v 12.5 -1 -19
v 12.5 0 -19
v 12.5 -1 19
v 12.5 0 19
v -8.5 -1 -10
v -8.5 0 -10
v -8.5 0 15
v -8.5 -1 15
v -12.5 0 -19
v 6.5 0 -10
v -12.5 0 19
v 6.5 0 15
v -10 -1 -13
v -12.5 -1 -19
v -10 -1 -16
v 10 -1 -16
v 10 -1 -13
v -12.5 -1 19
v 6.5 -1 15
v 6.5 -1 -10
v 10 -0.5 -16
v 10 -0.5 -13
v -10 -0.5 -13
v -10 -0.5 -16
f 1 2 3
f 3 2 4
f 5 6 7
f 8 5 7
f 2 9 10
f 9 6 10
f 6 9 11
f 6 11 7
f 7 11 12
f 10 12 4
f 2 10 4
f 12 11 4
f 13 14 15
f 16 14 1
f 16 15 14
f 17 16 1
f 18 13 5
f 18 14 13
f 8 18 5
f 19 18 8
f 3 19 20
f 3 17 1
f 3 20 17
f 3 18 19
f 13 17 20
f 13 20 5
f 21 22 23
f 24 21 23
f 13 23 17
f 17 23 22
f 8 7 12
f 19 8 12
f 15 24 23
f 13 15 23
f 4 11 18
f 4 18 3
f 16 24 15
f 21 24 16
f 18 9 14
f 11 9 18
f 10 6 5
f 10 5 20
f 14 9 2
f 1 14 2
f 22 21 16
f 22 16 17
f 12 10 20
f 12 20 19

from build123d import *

# Parameters (mm, degrees)
F0_W     = 25
F0_H     = 38
F0_W_2   = 20
F0_H_2   = 3
F0_W_3   = 15
F0_H_3   = 25
F1_DEPTH = 1
F2_W     = 22.4918248132
F2_H     = 4.8074135557
F2_W_2   = 20
F2_H_2   = 3
F3_DEPTH = 0.5


with BuildPart() as f1:
    # F0 (on Front) → F1 (new body)
    with BuildSketch(Plane.XZ):
        Rectangle(F0_W, F0_H)
        with Locations((0, -14.5)):
            Rectangle(F0_W_2, F0_H_2, mode=Mode.SUBTRACT)
        with Locations((-1, 2.5)):
            Rectangle(F0_W_3, F0_H_3, mode=Mode.SUBTRACT)
    extrude(amount=F1_DEPTH)

    # F2 (on face) → F3 (join)
    with BuildSketch(Plane(origin=(0, 0, 0), x_dir=(-1, 0, 0), z_dir=(0, 1, 0))):
        with Locations((0.0546504743, -14.3780573271)):
            Rectangle(F2_W, F2_H)
        with Locations((0, -14.5)):
            Rectangle(F2_W_2, F2_H_2, mode=Mode.SUBTRACT)
        with Locations((0, -14.5)):
            Rectangle(F2_W_2, F2_H_2)
    extrude(amount=-F3_DEPTH)


solid = f1.part
